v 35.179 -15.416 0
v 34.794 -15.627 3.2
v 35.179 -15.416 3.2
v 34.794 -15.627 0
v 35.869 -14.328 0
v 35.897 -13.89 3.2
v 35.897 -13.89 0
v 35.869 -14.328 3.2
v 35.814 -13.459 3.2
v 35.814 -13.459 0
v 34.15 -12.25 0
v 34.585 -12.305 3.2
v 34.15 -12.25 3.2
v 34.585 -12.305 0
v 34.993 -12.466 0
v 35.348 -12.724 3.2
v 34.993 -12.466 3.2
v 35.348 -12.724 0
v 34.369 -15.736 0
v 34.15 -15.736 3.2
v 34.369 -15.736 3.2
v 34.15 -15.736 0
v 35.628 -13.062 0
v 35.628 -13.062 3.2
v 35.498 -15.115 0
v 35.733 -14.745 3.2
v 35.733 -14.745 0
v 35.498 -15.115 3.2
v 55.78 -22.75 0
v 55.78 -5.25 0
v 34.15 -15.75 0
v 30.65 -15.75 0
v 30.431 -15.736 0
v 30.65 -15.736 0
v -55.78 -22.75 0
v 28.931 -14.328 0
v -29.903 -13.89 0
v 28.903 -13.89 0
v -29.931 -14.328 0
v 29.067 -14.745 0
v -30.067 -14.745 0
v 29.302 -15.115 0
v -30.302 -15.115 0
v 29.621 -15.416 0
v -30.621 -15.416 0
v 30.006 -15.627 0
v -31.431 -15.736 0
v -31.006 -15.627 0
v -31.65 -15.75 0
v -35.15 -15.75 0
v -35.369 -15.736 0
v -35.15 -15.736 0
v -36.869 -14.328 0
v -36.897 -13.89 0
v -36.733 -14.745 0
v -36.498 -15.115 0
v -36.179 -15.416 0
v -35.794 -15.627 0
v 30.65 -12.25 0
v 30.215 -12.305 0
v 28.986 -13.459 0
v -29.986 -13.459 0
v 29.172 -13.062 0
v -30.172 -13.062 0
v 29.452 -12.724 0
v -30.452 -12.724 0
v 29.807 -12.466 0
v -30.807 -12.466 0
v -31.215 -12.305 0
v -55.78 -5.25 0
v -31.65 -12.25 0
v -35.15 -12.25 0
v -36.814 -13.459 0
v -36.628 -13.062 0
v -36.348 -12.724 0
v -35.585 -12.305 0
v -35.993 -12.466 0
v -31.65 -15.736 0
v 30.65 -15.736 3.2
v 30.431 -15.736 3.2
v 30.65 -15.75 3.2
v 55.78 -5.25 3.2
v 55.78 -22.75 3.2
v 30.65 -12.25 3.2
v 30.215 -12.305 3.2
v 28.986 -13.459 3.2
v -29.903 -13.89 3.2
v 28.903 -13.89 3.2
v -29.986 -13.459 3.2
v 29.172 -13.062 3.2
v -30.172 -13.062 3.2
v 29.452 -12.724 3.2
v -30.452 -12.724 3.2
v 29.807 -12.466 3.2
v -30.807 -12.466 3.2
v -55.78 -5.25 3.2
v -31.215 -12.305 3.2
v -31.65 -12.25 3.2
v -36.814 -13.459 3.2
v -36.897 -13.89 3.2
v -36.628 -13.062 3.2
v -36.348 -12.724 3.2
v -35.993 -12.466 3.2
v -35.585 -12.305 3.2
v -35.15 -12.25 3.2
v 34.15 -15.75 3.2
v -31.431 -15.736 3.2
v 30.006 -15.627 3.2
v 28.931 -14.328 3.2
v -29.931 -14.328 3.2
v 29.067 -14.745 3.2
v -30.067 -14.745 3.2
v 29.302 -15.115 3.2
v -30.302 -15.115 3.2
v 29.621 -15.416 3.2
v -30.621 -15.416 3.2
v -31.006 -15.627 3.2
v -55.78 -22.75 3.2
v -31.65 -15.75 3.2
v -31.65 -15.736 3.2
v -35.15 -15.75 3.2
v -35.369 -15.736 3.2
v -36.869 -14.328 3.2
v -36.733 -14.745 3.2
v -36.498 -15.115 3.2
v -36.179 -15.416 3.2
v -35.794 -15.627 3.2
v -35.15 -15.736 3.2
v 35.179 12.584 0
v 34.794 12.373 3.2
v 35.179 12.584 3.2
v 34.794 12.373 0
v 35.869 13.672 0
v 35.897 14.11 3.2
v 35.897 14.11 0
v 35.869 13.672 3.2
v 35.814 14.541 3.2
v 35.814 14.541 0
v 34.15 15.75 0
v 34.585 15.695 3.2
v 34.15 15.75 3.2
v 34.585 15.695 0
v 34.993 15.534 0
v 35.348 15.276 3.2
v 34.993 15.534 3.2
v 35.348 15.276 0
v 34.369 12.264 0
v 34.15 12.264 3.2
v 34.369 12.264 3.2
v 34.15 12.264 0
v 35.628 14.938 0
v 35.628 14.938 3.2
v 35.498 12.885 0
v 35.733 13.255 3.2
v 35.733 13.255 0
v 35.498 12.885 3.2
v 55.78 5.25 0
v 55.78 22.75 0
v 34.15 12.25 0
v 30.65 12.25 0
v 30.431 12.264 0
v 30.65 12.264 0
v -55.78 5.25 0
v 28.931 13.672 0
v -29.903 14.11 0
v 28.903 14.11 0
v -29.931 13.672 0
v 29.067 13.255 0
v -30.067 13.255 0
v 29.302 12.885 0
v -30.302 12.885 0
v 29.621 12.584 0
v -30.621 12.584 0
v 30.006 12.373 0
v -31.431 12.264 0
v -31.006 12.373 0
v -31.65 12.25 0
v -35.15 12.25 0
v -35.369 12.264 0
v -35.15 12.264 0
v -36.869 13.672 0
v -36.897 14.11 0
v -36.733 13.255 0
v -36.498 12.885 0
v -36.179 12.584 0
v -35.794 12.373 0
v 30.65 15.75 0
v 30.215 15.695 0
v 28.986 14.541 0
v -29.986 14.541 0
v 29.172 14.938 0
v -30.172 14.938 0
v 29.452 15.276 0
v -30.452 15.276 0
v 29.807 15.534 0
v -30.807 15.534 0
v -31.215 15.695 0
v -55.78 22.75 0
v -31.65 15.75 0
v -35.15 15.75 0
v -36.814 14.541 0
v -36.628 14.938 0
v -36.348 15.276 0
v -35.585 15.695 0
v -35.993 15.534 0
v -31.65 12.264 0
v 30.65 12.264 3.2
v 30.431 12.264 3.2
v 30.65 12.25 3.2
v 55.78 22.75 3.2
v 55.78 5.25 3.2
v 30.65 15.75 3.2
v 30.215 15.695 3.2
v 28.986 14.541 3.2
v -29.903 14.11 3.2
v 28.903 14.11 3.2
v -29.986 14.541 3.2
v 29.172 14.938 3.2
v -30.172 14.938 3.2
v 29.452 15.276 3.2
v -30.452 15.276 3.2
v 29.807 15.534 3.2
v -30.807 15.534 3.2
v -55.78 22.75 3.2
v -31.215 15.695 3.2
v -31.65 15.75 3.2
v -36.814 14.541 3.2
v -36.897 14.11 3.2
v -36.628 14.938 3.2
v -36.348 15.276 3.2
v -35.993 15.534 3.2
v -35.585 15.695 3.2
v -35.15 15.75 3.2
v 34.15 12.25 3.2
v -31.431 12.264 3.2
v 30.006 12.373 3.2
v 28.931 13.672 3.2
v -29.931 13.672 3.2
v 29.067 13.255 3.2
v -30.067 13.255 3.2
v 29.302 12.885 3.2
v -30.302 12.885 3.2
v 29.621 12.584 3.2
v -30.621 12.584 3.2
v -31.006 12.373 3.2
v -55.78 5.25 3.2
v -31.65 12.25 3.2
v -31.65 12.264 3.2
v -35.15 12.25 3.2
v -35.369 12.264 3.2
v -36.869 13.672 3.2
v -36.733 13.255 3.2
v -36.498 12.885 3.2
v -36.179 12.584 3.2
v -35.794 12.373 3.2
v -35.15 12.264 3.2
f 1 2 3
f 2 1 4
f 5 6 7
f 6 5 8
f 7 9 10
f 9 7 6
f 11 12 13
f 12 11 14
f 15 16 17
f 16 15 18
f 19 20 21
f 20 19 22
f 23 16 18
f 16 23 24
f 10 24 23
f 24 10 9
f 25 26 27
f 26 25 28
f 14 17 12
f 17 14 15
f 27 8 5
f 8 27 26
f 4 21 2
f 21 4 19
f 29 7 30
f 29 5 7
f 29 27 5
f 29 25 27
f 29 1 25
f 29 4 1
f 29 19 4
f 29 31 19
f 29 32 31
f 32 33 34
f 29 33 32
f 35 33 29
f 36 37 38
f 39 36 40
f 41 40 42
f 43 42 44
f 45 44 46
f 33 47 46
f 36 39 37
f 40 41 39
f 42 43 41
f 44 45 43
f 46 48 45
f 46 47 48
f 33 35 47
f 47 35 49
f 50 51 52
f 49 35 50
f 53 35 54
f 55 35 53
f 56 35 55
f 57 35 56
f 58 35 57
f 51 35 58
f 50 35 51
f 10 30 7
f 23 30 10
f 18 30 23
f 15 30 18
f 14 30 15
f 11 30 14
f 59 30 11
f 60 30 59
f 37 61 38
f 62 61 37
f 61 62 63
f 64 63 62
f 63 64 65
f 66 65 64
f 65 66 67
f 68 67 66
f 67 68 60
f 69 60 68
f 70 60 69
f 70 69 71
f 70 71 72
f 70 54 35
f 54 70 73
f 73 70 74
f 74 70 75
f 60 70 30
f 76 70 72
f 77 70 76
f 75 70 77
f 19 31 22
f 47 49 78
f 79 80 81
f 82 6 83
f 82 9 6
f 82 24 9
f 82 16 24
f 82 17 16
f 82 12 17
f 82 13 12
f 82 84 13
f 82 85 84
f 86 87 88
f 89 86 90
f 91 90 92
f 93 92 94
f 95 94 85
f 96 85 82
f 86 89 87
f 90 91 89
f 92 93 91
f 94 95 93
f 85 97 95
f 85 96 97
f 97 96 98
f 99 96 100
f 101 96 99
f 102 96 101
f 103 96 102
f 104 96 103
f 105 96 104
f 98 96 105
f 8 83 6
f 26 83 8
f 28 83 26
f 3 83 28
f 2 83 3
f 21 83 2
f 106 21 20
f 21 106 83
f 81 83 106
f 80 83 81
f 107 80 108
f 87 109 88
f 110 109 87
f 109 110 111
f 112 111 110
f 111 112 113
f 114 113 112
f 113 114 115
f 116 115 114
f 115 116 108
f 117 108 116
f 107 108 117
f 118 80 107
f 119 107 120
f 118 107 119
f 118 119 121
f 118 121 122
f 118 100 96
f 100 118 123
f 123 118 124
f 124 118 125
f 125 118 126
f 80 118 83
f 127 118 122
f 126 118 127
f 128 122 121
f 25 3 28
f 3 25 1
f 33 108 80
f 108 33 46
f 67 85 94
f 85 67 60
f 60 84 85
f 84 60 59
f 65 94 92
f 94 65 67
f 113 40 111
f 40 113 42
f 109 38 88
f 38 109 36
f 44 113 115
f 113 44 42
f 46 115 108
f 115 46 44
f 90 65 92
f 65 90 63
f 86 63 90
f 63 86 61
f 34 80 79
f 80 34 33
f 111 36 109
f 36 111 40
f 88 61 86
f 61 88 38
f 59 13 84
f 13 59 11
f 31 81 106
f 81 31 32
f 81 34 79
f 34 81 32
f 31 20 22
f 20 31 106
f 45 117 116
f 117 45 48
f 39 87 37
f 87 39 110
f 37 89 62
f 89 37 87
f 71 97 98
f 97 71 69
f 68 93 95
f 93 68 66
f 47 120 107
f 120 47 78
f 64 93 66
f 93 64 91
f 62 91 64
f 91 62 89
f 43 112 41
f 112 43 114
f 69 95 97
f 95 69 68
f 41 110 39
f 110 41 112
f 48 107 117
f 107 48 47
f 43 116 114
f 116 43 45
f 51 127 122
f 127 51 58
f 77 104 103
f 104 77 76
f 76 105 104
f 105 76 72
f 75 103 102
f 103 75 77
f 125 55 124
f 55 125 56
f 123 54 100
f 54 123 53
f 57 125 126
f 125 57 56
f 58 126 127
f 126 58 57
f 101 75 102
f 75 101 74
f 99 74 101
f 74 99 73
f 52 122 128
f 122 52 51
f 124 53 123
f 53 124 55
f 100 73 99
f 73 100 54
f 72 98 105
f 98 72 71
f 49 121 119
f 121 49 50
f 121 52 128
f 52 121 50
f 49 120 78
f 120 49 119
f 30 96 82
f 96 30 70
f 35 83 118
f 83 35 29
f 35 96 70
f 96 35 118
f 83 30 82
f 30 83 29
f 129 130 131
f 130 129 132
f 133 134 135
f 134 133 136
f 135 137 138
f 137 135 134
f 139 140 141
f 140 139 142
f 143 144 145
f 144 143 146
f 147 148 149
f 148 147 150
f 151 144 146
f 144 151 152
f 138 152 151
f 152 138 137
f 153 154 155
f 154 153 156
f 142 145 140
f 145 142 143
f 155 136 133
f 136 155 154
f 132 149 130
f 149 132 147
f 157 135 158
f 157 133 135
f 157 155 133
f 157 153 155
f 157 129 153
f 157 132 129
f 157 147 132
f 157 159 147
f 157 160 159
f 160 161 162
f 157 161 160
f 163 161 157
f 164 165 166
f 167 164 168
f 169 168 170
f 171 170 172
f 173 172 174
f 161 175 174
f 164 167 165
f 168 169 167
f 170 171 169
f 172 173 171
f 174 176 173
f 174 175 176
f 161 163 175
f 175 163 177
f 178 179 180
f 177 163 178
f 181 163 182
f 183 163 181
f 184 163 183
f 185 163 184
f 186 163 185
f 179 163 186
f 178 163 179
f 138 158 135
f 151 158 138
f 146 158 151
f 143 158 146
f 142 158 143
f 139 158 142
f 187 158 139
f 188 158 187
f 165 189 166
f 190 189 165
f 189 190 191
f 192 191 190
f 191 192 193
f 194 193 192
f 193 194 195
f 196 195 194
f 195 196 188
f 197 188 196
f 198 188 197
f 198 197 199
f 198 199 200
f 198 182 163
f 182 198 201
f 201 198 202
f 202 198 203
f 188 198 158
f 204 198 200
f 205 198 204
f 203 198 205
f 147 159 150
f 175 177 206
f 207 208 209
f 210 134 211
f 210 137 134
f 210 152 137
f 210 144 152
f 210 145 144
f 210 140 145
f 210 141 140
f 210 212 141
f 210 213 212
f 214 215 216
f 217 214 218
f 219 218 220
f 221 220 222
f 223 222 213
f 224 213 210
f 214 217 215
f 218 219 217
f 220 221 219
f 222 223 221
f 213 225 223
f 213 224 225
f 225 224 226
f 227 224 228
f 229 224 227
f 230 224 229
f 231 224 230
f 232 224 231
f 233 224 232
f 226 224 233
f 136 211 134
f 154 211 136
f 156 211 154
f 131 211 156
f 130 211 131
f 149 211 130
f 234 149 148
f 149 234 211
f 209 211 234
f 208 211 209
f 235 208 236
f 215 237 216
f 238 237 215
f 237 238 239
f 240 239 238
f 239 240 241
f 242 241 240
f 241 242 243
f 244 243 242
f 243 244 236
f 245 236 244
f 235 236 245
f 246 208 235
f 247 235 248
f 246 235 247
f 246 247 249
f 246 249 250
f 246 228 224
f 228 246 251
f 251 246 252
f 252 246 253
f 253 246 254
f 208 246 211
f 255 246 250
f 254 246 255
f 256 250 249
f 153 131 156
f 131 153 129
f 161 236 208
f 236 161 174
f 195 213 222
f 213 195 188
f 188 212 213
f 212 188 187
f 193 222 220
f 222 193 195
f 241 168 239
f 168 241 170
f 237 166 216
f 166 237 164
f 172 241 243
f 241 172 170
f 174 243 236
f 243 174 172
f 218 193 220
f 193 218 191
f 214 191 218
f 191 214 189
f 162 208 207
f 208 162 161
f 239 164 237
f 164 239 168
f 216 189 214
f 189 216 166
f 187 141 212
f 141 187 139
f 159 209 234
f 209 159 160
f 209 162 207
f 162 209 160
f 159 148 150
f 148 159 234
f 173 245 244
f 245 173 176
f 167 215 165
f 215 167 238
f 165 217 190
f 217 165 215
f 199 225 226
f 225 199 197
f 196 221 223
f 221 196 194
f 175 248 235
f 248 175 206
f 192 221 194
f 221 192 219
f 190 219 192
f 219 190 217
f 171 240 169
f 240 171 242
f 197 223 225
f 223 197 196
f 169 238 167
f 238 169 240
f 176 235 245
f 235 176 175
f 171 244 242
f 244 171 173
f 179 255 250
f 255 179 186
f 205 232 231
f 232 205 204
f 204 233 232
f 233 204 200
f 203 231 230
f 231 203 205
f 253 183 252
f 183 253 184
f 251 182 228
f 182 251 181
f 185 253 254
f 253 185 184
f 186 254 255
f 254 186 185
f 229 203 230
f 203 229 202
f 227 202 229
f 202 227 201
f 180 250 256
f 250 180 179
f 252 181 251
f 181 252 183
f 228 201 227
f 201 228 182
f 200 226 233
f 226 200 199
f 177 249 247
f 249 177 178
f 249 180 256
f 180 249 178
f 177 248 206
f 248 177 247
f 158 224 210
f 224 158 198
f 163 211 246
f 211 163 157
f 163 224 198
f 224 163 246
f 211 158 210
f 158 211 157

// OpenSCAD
// file: RPiModules.scad
//Version 8
include <RPiDims.scad>;

$fn=25;
//returns a vector of the center of the circle at each corner 
//of a rounded square in the x-y plane
function corner_vectors(width, breadth, radius = 0) = 
    [
        [radius-width/2,radius-breadth/2,0],
        [width/2-radius,radius-breadth/2,0],
        [radius-width/2,breadth/2-radius,0],
        [width/2-radius,breadth/2-radius,0]];

module rounded_square(width,breadth,radius) {
    union() {
        square(size=[width-2*radius,breadth],center=true);
        square(size=[width,breadth-2*radius],center=true);
        
        for(cv = corner_vectors(width,breadth,radius)) {
            translate(v=cv) {
                circle(r=radius);
            }
        }
    }
}

module rounded_box_sides(width,breadth,radius,height,thickness) {
    linear_extrude(height=height) {
        difference() {
            rounded_square(width,breadth,radius);
            rounded_square(width-2*thickness,breadth-2*thickness,radius-thickness);
        }
    }
}

module key_hole(d1,d2,dist) {
    circle(d=d1);
    translate(v=[0,-1*dist,0]) {
        circle(d=d2);
    }
    translate(v=[0,-0.5*dist,0]) {
        square(size=[d1,dist], center=true);
    }
}

module rounded_square_triag_ring(width,breadth,radius,height,thickness) {
    difference() {
        rounded_box_sides(width,breadth,radius,height,thickness);
        linear_extrude(height=height,scale=[1-2*thickness/width,1-2*thickness/breadth]) {
            rounded_square(width,breadth,radius);
        }
    }
}

module rpi_wall_mount(remove_center_square = true, print_holes = true) {

    //Wall mount plates
    difference() {
        linear_extrude(height=thickness) {
            difference() {
                rounded_square(width,breadth,corner_radius+thickness);
                if (remove_center_square) {
                    square(size=[width-2*mount_plate_width,breadth-8*thickness],center=true);
                }
            }
        }
        if (print_holes) {
            translate(v=[0,hdist/2,0]) {
                linear_extrude(height=thickness) {
                    for (cv = corner_vectors(width,breadth-hdist,corner_radius+thickness)) {
                        translate(v=cv) {
                            key_hole(hd1,hd2,hdist);
                        }
                    }
                }
            }
        }
    }

}

module rpi_case(print_holes = true)
{
    difference() {
        //Rounded sides
        union() {
            rounded_box_sides(width,breadth,corner_radius+thickness,height,thickness);
            for (i=[-1,1]) {
                translate([i*(width-mount_plate_width)/2,0,cable_hole_height/2+thickness]) {
                    //Cable hole boxes (left/right)
                    cube(size=[mount_plate_width,cable_hole_width+2*thickness,cable_hole_height+2*thickness],center=true);
                    for (j=[-1,1]) {
                        translate([0,j*(breadth-1.5*mount_plate_width)/2,-cable_hole_height/2-thickness]) {
                            rounded_box_sides(mount_plate_width,1.5*mount_plate_width,corner_radius+thickness,cable_hole_height+2*thickness,thickness);
                        }
                    }
                }
                translate([0,i*(breadth-4*thickness)/2,cable_hole_height/2+thickness]) {
                    //Cable hole boxes (top/bottom)
                    cube(size=[cable_hole_width+2*thickness,4*thickness,cable_hole_height+2*thickness],center=true);
                }
            }
        }
        //Ventilation grille
        translate (v=[-0.5*grille_dist*(grille_count-1),thickness-breadth/2,0.15*height]) {
            rotate(a = 90,v=[1,0,0]) {
                for (i = [0:grille_count-1]) {
                    translate (v=[i*grille_dist,4*grille_width,-breadth]) {
                        //Ventilation grille
                        linear_extrude(height=breadth+2*thickness, twist=0, center=false) {
                            union() {
                                circle(d=grille_width);
                                translate(v=[-0.5*grille_width,0,0]) {
                                    square(size=[grille_width,0.4*height]);
                                }
                                translate(v=[0,0.4*height,0]) {
                                    circle(d=grille_width);
                                }
                            }
                        }
                    }
                }
            }
        }
        //Cable holes
        for (i=[-1,1]) {
            translate([i*(width-mount_plate_width)/2,0,cable_hole_height/2+thickness]) {
                cube(size=[mount_plate_width-thickness,cable_hole_width,cable_hole_height], center=true);
            }
            translate([0,i*(breadth-4*thickness)/2,cable_hole_height/2+thickness]) {
                //Cable hole boxes (top/bottom)
                cube(size=[cable_hole_width,3*thickness,cable_hole_height],center=true);
            }
        }
    }

    rpi_wall_mount();

    //Screen mount support rims
    translate(v=[0,0,height-screen_thickness_at_mounts]) {
        rounded_box_sides(width-2*thickness,breadth-2*thickness,corner_radius,screen_thickness_at_mounts-screen_edge_thickness,2*thickness);
        translate(v=[0,0,-2*thickness]) {
            difference() {
                rounded_square_triag_ring(width-2*thickness,breadth-2*thickness,corner_radius,2*thickness,2*thickness);
                for (i=[-1,1]) {
                    translate(v=[i*screen_mount_dist_x*0.5+screen_mount_offset_x,0,thickness]) {
                        cube([7*screen_mount_hole_diameter,breadth-2*thickness,2*thickness], true);
                    }
                }
            }
        }
    }
}

module rpi_screen_mount_plates() {
    //Screen mount plates
    rotate(90) {
        for (i=[-1,1]) {
            translate([i*4*screen_mount_hole_diameter,0,thickness]) {
                difference() {
                    cube([5*screen_mount_hole_diameter,breadth-2*thickness,2*thickness], true);
                    for (i=[-1,1]) {
                        translate([0,i*screen_mount_dist_y/2+screen_mount_offset_y,0]) {
                            for (j=[-1,1]) {
                                translate([0,j*screen_mount_hole_diameter/2,0]) {
                                    cylinder(d=screen_mount_hole_diameter,h=2*thickness,center=true);
                                }
                            }
                            cube([screen_mount_hole_diameter,screen_mount_hole_diameter,2*thickness],true);
                        }
                    }
                }
            }
        }
    }
}

module rpt_mount_plate() {
    linear_extrude(height=thickness) {
        difference() {
            square(size=[width-2*mount_plate_width-2*lth,breadth-8*thickness-2*lth],center=true);
            for (i=[-1,1]) {
                translate(v=[i*75/2,breadth/2-40-lth]) {
                    key_hole(hd1,hd2,hdist);
                }
            }

        }
    }
    for (i=[-1,1]) {
        translate(v=[i*width/4,(breadth-8*thickness)/2-thickness-lth,thickness]) {
            intersection() {
                linear_extrude(height=thickness, scale=2) {
                    square([width/4,2*thickness], center=true);
                }
                translate([0,thickness,0]) {
                    linear_extrude(height=thickness) {
                        square([width/4,2*thickness], center=true);
                    }
                }
            }
            translate([0,thickness,thickness]) {
                linear_extrude(height=thickness) {
                    square([width/4,2*thickness], center=true);
                }
            }
                linear_extrude(height=2*thickness) {
                    square([width/4,2*thickness], center=true);
                }

        }
    }
}
// file: RPiDims.scad
thickness=1.6;                                        //Thickness of case walls
lth=0.2;                                              //Layer thickness
width=192.96+2.5*thickness;                           //Width of case (x dim)
breadth=110.76+2.5*thickness;                         //Breadth of case (y dim)
height=55;                                            //Height of case (z dim)
corner_radius=7;                                      //Radius of screen corners
hd1=4;                                                //Mount key hole diameter 1
hd2=9;                                                //Mount key hole diameter 2
hdist=6;                                              //Mount key hole distance
mount_plate_width=2*(corner_radius+thickness);        //Mount plate width
screen_edge_thickness=0.8;                            //Screen edge thickness 
screen_thickness_at_mounts=8.5;                       //Screen thickness at mounts
screen_mount_hole_diameter=3.5;                       //Screen mount hole diameter
screen_mount_plate_width=3*screen_mount_hole_diameter;//Screen mount plate width
screen_mount_dist_x=125.46;                           //Distance between screen mount holes in x direction
screen_mount_dist_y=65.8;                             //Distance between screen mount holes in y direction
screen_mount_offset_x=1.05;                           //Screen mount holes offset from center in x direction
screen_mount_offset_y=0.5;                            //Screen mount holes offset from center in y direction
grille_width=1.5*thickness;                           //Width of each ventilation grille
grille_dist=6*thickness;                              //Distance between ventilation grilles
grille_count=12;                                      //Number of ventilation grilles
cable_hole_height = 10;                               //
cable_hole_width=12;                                  //
// main file
include <RPiDims.scad>
use <RPiModules.scad>

rpi_screen_mount_plates();
